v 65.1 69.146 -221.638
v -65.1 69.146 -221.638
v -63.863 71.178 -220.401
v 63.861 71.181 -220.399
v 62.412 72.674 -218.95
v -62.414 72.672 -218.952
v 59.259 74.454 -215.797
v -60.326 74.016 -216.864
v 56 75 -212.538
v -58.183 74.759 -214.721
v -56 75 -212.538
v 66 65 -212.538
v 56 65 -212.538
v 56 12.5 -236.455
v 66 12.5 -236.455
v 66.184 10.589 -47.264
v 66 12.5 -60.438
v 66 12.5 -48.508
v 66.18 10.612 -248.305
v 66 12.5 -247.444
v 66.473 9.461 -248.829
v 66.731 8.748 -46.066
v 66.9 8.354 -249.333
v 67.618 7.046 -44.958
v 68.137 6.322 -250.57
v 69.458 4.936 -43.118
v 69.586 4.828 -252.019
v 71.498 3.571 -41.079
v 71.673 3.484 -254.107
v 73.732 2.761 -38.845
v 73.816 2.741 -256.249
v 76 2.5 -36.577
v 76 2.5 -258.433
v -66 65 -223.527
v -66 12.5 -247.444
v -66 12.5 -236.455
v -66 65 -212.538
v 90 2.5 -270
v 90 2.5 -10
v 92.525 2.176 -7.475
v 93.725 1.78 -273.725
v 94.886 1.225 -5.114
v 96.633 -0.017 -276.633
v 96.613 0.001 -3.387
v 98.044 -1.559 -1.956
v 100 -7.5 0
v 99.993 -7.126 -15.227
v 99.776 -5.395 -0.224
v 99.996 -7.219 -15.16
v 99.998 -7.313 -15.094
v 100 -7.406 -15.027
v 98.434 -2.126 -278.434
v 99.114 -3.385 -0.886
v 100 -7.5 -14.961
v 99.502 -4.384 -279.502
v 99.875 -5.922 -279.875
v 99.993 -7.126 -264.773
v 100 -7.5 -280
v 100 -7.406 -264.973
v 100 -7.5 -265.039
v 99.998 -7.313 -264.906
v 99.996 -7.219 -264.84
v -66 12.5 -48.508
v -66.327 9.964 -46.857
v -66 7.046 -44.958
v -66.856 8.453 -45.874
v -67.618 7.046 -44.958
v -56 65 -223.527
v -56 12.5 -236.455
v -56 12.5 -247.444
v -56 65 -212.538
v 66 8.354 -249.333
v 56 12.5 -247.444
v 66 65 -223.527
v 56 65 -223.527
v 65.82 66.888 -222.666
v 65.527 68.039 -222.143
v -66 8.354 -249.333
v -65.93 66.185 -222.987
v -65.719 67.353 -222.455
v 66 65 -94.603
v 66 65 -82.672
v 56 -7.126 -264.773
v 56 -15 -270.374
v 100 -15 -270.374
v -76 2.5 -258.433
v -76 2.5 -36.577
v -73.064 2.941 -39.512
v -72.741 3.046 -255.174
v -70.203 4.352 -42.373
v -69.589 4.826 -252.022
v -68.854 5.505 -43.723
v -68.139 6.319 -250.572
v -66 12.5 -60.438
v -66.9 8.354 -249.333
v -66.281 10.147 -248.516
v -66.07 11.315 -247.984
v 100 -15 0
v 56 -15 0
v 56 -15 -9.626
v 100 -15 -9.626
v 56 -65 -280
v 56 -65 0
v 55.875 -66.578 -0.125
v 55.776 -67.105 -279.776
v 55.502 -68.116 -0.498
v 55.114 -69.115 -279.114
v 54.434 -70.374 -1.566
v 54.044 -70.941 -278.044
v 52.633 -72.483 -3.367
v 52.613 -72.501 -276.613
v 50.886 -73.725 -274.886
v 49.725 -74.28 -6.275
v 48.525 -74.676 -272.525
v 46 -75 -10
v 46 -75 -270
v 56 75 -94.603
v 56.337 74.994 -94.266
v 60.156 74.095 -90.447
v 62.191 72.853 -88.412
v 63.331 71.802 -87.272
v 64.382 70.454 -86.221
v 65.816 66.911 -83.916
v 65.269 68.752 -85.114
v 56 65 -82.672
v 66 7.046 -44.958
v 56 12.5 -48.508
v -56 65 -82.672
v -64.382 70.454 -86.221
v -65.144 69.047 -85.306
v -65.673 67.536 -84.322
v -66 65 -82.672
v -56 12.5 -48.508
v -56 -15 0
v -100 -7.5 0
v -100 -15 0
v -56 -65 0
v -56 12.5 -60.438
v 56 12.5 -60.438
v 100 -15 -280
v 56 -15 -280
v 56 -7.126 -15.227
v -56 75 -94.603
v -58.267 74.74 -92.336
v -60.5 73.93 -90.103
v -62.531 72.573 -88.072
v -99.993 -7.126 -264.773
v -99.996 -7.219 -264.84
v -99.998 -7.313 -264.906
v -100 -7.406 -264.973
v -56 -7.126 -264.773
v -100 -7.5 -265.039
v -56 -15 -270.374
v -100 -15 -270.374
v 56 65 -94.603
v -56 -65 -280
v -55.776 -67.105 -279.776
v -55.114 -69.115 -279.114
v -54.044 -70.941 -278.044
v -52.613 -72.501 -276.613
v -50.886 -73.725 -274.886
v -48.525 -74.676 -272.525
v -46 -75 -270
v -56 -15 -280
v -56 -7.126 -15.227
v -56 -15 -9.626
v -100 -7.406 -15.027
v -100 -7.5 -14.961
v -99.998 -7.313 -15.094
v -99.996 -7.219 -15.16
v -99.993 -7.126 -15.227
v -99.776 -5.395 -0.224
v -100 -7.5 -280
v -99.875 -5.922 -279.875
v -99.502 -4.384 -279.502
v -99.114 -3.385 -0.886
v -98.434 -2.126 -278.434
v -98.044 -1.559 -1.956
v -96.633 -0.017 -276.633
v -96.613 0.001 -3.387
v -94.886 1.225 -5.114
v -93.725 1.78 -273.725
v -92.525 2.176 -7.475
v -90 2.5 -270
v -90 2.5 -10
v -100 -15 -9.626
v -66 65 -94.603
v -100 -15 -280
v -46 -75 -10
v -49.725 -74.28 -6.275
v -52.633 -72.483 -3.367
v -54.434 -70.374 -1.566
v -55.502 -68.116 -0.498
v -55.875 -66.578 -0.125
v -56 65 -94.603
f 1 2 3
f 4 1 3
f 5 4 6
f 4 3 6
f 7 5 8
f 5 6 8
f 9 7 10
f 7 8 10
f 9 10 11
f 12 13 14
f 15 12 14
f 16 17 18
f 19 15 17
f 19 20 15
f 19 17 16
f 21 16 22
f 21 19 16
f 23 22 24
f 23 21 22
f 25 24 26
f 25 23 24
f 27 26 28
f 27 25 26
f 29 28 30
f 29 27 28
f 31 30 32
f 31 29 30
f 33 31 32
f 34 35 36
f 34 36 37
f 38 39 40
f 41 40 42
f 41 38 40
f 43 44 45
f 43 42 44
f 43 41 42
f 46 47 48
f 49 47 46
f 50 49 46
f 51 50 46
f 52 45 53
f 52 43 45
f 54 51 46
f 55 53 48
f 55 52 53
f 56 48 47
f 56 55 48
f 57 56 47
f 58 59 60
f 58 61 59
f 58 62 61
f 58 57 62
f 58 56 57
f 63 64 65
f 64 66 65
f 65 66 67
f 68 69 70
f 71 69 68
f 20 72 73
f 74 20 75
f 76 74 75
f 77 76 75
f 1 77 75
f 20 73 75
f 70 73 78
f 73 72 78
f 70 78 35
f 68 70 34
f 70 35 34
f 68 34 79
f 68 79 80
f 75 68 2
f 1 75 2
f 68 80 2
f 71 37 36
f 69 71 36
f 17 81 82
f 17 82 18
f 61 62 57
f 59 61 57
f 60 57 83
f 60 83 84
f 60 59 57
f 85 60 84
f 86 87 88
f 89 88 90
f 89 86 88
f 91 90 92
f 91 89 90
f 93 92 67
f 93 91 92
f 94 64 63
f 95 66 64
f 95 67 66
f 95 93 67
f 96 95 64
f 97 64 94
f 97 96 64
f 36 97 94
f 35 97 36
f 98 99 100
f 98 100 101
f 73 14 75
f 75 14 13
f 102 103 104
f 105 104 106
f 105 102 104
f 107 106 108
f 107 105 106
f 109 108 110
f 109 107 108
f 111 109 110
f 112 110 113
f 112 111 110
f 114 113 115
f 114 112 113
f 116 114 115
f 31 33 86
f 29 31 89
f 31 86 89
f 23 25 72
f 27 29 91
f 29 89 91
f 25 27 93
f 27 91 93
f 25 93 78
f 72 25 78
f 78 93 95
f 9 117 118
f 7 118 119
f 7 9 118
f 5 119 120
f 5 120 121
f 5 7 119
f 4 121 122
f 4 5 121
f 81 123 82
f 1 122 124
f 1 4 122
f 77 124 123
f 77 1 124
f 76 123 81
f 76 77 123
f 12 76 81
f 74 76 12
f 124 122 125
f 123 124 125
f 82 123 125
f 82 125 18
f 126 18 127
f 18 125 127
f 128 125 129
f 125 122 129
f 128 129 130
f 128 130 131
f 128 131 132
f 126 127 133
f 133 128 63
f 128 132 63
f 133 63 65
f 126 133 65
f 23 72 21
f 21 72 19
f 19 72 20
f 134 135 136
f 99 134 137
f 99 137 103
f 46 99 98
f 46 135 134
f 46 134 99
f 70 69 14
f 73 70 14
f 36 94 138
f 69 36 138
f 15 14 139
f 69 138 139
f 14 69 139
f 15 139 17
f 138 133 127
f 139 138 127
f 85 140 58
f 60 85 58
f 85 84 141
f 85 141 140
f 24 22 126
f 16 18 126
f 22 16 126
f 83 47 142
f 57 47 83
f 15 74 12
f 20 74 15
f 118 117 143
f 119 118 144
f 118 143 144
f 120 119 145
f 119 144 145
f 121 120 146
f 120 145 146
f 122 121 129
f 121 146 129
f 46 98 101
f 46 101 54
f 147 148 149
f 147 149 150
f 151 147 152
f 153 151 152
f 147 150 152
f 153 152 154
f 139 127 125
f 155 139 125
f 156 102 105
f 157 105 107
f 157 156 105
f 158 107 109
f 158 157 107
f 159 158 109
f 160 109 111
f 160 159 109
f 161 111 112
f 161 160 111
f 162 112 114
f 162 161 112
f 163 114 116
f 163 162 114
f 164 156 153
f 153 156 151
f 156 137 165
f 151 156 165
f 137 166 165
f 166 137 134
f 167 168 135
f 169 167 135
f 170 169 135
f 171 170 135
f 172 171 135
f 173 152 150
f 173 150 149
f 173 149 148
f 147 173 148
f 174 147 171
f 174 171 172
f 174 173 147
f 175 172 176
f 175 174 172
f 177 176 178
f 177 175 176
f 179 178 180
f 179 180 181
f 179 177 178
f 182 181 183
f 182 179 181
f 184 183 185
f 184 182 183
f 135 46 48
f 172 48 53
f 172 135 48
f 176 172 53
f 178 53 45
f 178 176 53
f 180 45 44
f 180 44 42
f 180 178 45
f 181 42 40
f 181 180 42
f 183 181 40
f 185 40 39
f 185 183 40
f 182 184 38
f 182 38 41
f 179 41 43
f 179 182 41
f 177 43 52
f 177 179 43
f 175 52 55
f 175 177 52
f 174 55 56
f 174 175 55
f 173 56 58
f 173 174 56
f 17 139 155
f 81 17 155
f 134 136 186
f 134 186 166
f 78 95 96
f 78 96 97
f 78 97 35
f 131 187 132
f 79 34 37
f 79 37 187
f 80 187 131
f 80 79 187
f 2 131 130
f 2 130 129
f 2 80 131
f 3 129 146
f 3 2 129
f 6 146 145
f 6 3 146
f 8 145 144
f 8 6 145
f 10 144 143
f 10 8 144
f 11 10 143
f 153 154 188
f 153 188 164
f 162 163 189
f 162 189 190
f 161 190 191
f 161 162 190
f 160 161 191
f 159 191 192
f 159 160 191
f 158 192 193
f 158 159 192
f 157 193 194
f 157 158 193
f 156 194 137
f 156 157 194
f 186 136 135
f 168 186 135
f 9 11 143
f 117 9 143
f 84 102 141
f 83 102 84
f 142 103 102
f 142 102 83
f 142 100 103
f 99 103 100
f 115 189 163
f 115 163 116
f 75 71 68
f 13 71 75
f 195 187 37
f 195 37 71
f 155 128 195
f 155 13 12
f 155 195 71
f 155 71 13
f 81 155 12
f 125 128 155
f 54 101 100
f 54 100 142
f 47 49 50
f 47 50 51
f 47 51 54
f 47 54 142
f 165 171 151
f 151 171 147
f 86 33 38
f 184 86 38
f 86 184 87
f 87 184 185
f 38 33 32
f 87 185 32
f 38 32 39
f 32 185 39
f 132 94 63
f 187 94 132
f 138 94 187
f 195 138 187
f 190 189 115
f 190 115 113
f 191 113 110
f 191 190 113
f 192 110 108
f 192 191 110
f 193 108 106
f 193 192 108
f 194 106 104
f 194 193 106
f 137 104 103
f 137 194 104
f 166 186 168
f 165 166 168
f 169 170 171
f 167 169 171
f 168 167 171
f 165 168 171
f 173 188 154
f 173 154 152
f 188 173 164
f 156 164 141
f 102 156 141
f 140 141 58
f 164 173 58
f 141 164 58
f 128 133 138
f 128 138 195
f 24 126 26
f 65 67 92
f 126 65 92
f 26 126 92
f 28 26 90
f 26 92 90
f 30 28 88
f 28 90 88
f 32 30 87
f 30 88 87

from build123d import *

# Parameters (mm, degrees)
SKETCH1_W           = 200
SKETCH1_H           = 150
BOSS_EXTRUDE1_DEPTH = 280
SKETCH2_W           = 44
SKETCH2_H           = 60
SKETCH2_W_2         = 34
SKETCH2_H_2         = 72.5
CUT_EXTRUDE1_DEPTH  = 280
CUT_EXTRUDE5_DEPTH  = 200
CUT_EXTRUDE8_DEPTH  = 44
CUT_EXTRUDE9_DEPTH  = 44
SKETCH6_W           = 112
SKETCH6_H           = 52.5
CUT_EXTRUDE7_DEPTH  = 280
FILLET1_START       = -100
FILLET1_DEPTH       = 200
FILLET1_START_2     = -76
FILLET1_2_DEPTH     = 10
FILLET1_START_3     = 66
FILLET1_3_DEPTH     = 10
FILLET1_START_4     = -66
FILLET1_4_DEPTH     = 132
FILLET1_START_5     = -281
FILLET1_5_DEPTH     = 282


with BuildPart() as part:
    # Sketch1 → Boss-Extrude1 (new body)
    with BuildSketch(Plane.XY):
        Rectangle(SKETCH1_W, SKETCH1_H)
    extrude(amount=-BOSS_EXTRUDE1_DEPTH)

    # Sketch2 → Cut-Extrude1 (cut)
    with BuildSketch(Plane.XY):
        with Locations((78, -45)):
            Rectangle(SKETCH2_W, SKETCH2_H)
        with Locations((-78, -45)):
            Rectangle(SKETCH2_W, SKETCH2_H)
        with Locations((83, 38.75)):
            Rectangle(SKETCH2_W_2, SKETCH2_H_2)
        with Locations((-83, 38.75)):
            Rectangle(SKETCH2_W_2, SKETCH2_H_2)
    extrude(amount=-CUT_EXTRUDE1_DEPTH, mode=Mode.SUBTRACT)

    # Sketch3 → Cut-Extrude5 (cut)
    with BuildSketch(Plane.ZY.offset(100)):
        Polygon((-280, 2.5), (-274.399041425, 2.5), (-252, 2.5), (-218.971094498, 75), (-280, 75), align=None)
        Polygon((-236.455453487, 12.5), (-168.766953205, 12.5), (-60.438488841, 12.5), (-94.602997447, 65), (-144.84946991, 65), (-212.537970192, 65), align=None)
        Polygon((-89.179559504, 75), (-42, 2.5), (-5.600958575, 2.5), (0, 2.5), (0, 75), align=None)
    extrude(amount=-CUT_EXTRUDE5_DEPTH, mode=Mode.SUBTRACT)

    # Sketch5 → Cut-Extrude8 (cut)
    with BuildSketch(Plane.ZY.offset(100)):
        Polygon((-264.773291637, -7.125749789), (-270.374250211, -15), (-140, -15), (-140, -7.125749789), align=None)
        Polygon((-15.226708363, -7.125749789), (-140, -7.125749789), (-140, -15), (-9.625749789, -15), align=None)
    extrude(amount=-CUT_EXTRUDE8_DEPTH, mode=Mode.SUBTRACT)

    # Sketch7 → Cut-Extrude9 (cut)
    with BuildSketch(Plane(origin=(100, 0, 0), x_dir=(0, 0, -1), z_dir=(1, 0, 0))):
        Polygon((9.625749789, -15), (15.226708363, -7.125749789), (264.773291637, -7.125749789), (270.374250211, -15), align=None)
    extrude(amount=-CUT_EXTRUDE9_DEPTH, mode=Mode.SUBTRACT)

    # Sketch6 → Cut-Extrude7 (cut)
    with BuildSketch(Plane.XY):
        with Locations((0, 38.75)):
            Rectangle(SKETCH6_W, SKETCH6_H)
    extrude(amount=-CUT_EXTRUDE7_DEPTH, mode=Mode.SUBTRACT)

    # Fillet1: read off the stored shape, not the designer's step
    # Fillet1 outline → Fillet1 (cut)
    with BuildSketch(Plane.YZ.offset(FILLET1_START)):
        with BuildLine():
            Line((-75, 0), (-75, -10))
            ThreePointArc((-75, -10), (-72.071067812, -2.928932188), (-65, 0))
            Line((-65, 0), (-75, 0))
        make_face()
        with BuildLine():
            ThreePointArc((-65, -280), (-72.071067812, -277.071067812), (-75, -270))
            Line((-75, -270), (-75, -280))
            Line((-75, -280), (-65, -280))
        make_face()
        with BuildLine():
            Line((2.5, 0), (-7.5, 0))
            ThreePointArc((-7.5, 0), (-0.428932188, -2.928932188), (2.5, -10))
            Line((2.5, -10), (2.5, 0))
        make_face()
        with BuildLine():
            ThreePointArc((2.5, -270), (-0.428932188, -277.071067812), (-7.5, -280))
            Line((-7.5, -280), (2.5, -280))
            Line((2.5, -280), (2.5, -270))
        make_face()
        with BuildLine():
            Line((75, -89.179559504), (70.454316835, -86.221444616))
            ThreePointArc((70.454316835, -86.221444616), (73.790425711, -89.835564613), (75, -94.602997447))
            Line((75, -94.602997447), (75, -89.179559504))
        make_face()
        with BuildLine():
            ThreePointArc((75, -212.537970192), (73.410042611, -217.948255145), (69.145763344, -221.638115591))
            Line((69.145763344, -221.638115591), (75, -218.971094498))
            Line((75, -218.971094498), (75, -212.537970192))
        make_face()
    extrude(amount=FILLET1_DEPTH, mode=Mode.SUBTRACT)

    # Fillet1 2 outline → Fillet1 2 (add)
    with BuildSketch(Plane.YZ.offset(FILLET1_START_2)):
        with BuildLine():
            ThreePointArc((7.045683165, -44.958114888), (3.709574289, -41.343994891), (2.5, -36.576562057))
            Line((2.5, -36.576562057), (2.5, -258.433124306))
            ThreePointArc((2.5, -258.433124306), (4.089957389, -253.022839352), (8.354236656, -249.332978906))
            Line((8.354236656, -249.332978906), (69.145763344, -221.638115591))
            ThreePointArc((69.145763344, -221.638115591), (73.410042611, -217.948255145), (75, -212.537970192))
            Line((75, -212.537970192), (75, -94.602997447))
            ThreePointArc((75, -94.602997447), (73.790425711, -89.835564613), (70.454316835, -86.221444616))
            Line((70.454316835, -86.221444616), (7.045683165, -44.958114888))
        make_face()
    extrude(amount=FILLET1_2_DEPTH)

    # Fillet1 3 outline → Fillet1 3 (add)
    with BuildSketch(Plane.YZ.offset(FILLET1_START_3)):
        with BuildLine():
            ThreePointArc((7.045683165, -44.958114888), (3.709574289, -41.343994891), (2.5, -36.576562057))
            Line((2.5, -36.576562057), (2.5, -258.433124306))
            ThreePointArc((2.5, -258.433124306), (4.089957389, -253.022839352), (8.354236656, -249.332978906))
            Line((8.354236656, -249.332978906), (69.145763344, -221.638115591))
            ThreePointArc((69.145763344, -221.638115591), (73.410042611, -217.948255145), (75, -212.537970192))
            Line((75, -212.537970192), (75, -94.602997447))
            ThreePointArc((75, -94.602997447), (73.790425711, -89.835564613), (70.454316835, -86.221444616))
            Line((70.454316835, -86.221444616), (7.045683165, -44.958114888))
        make_face()
    extrude(amount=FILLET1_3_DEPTH)

    # Fillet1 4 outline → Fillet1 4 (add)
    with BuildSketch(Plane.YZ.offset(FILLET1_START_4)):
        with BuildLine():
            ThreePointArc((7.045683165, -44.958114888), (3.709574289, -41.343994891), (2.5, -36.576562057))
            Line((2.5, -36.576562057), (2.5, -42))
            Line((2.5, -42), (7.045683165, -44.958114888))
        make_face()
        with BuildLine():
            Line((2.5, -252), (2.5, -258.433124306))
            ThreePointArc((2.5, -258.433124306), (4.089957389, -253.022839352), (8.354236656, -249.332978906))
            Line((8.354236656, -249.332978906), (2.5, -252))
        make_face()
    extrude(amount=FILLET1_4_DEPTH)

    # Fillet1 5 outline → Fillet1 5 (cut)
    with BuildSketch(Plane.XY.offset(FILLET1_START_5)):
        with BuildLine():
            ThreePointArc((56, 75), (63.071067812, 72.071067812), (66, 65))
            Line((66, 65), (66, 12.5))
            ThreePointArc((66, 12.5), (68.928932188, 5.428932188), (76, 2.5))
            Line((76, 2.5), (76, 75))
            Line((76, 75), (56, 75))
        make_face()
        with BuildLine():
            ThreePointArc((-66, 65), (-63.071067812, 72.071067812), (-56, 75))
            Line((-56, 75), (-76, 75))
            Line((-76, 75), (-76, 2.5))
            ThreePointArc((-76, 2.5), (-68.928932188, 5.428932188), (-66, 12.5))
            Line((-66, 12.5), (-66, 65))
        make_face()
        with BuildLine():
            Line((100, 2.5), (90, 2.5))
            ThreePointArc((90, 2.5), (97.071067812, -0.428932188), (100, -7.5))
            Line((100, -7.5), (100, 2.5))
        make_face()
        with BuildLine():
            Line((-90, 2.5), (-100, 2.5))
            Line((-100, 2.5), (-100, -7.5))
            ThreePointArc((-100, -7.5), (-97.071067812, -0.428932188), (-90, 2.5))
        make_face()
        with BuildLine():
            Line((56, -75), (56, -65))
            ThreePointArc((56, -65), (53.071067812, -72.071067812), (46, -75))
            Line((46, -75), (56, -75))
        make_face()
        with BuildLine():
            ThreePointArc((-46, -75), (-53.071067812, -72.071067812), (-56, -65))
            Line((-56, -65), (-56, -75))
            Line((-56, -75), (-46, -75))
        make_face()
    extrude(amount=FILLET1_5_DEPTH, mode=Mode.SUBTRACT)


solid = part.part
